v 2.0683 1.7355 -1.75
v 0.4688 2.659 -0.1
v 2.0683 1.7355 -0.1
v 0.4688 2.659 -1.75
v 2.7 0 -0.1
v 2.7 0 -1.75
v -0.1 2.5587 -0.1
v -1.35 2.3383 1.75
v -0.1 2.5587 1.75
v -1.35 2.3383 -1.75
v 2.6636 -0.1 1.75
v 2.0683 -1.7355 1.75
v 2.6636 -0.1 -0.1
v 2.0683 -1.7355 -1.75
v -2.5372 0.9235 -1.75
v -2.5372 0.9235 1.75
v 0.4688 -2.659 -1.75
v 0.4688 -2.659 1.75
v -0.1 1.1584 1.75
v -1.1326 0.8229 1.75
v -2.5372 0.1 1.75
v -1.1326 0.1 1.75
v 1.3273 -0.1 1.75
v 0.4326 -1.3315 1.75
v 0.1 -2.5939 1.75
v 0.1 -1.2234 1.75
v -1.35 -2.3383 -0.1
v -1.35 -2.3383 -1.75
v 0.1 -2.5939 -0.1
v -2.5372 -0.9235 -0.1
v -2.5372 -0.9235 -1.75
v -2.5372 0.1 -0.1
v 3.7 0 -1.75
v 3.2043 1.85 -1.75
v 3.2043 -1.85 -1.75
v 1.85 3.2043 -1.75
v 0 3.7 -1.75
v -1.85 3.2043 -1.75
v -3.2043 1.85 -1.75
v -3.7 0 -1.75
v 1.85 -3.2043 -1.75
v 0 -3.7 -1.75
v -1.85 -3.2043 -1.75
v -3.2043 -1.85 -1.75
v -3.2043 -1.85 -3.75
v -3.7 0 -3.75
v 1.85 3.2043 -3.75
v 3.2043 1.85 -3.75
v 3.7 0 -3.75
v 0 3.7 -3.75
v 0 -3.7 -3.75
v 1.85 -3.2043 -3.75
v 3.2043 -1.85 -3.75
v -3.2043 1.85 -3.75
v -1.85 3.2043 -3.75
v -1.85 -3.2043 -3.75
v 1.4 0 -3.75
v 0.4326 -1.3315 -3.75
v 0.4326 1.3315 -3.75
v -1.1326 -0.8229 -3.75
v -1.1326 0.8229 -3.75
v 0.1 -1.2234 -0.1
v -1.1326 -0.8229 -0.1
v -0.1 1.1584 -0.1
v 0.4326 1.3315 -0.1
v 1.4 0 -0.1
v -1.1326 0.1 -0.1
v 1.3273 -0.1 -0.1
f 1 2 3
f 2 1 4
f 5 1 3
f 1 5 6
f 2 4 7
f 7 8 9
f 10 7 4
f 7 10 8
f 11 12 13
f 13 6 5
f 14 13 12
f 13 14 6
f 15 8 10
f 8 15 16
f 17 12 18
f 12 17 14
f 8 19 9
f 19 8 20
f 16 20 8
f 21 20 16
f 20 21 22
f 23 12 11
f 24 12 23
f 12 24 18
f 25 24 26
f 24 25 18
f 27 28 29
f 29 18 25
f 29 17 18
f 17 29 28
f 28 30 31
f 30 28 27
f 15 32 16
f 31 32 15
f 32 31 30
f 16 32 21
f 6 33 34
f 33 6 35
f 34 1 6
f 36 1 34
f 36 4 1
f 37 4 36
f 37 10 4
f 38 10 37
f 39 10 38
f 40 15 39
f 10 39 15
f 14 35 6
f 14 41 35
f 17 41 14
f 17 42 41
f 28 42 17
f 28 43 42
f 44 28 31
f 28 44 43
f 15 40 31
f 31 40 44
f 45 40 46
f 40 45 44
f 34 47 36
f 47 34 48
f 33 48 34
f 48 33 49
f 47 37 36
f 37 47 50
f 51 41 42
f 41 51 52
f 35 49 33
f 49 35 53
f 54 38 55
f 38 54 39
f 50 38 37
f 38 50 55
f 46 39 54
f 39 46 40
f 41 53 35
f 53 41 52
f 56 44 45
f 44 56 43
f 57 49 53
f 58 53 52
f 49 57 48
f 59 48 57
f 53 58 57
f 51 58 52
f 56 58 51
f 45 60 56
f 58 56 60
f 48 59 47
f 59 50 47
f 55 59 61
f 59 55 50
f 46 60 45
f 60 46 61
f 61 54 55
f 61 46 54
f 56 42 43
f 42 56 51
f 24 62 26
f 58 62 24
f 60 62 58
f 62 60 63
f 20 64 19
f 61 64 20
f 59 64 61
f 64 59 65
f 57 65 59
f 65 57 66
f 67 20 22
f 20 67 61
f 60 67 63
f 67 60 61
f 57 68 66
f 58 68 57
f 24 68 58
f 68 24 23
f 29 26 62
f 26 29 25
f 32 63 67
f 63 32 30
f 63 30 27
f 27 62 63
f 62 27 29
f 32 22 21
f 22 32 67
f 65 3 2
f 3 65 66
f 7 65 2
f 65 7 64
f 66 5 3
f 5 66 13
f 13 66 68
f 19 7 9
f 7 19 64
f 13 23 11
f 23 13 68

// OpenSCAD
// file: arm_holder.scad
module arm_holder(external_radius, internal_radius, width, tolerence)
{
    union()
    {
        scale(v = [1, 1, 2]) union() {
            difference() {
                cube(size = [external_radius, external_radius, width]);
                translate(v = [0, 0, width/2]) cylinder(h = width*2, r = external_radius, center = true);
            }
            translate(v = [0, external_radius*2, 0]) mirror(v = [0, 1, 0])  difference() {
                cube(size = [external_radius, external_radius, width]);
                translate(v = [0, 0, width/2]) cylinder(h = width*2, r = external_radius, center = true);
            }
        }

        difference()
        {
            translate(v = [0, 0, width/2]) cylinder(h = width, r = external_radius, center = true);
            cylinder(h = 13, r = internal_radius, center = true);
        }
    }
}


rotate(a = 90, v = [0, 1, 0]) arm_holder(5, 3, 4, .1);
// main file
use <arm_holder.scad>

module arm_pin(height, radius, hat_radius)
{
    difference()
    {
        union()
        {
            cylinder(h = height, r = radius, center = true);
            translate(v = [ 0, 0, -height / 2 - 1 ]) cylinder(h = 2, r = hat_radius, center = true);
        }
        cylinder(h = 20, r = 1.4, center = true);
        translate(v = [ -2, -2, 2 ]) cube(size = 4.2, center = true);
        translate(v = [ 2, 2, 2 ]) cube(size = 4.2, center = true);
    }
}

arm_pin(3.5, 2.7, 3.7);
